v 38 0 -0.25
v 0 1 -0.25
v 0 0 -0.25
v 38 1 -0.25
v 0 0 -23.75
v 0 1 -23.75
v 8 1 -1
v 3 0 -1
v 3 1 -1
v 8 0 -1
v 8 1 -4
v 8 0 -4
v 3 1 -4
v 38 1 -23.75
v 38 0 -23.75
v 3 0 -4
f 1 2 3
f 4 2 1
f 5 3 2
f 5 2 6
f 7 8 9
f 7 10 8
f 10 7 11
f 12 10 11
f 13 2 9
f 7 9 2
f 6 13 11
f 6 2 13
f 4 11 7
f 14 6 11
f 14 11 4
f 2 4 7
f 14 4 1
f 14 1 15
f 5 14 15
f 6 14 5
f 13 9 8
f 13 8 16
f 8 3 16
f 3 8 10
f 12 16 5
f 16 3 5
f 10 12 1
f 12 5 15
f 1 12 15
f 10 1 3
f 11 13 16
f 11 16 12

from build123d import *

# Parameters (mm, degrees)
SKETCH1_W           = 40
SKETCH1_H           = 24
BOSS_EXTRUDE1_DEPTH = 2
SKETCH2_W           = 40
SKETCH2_H           = 24
SKETCH2_W_2         = 36
SKETCH2_H_2         = 22
BOSS_EXTRUDE3_DEPTH = 8
SKETCH5_W           = 4
SKETCH5_H           = 3
CUT_EXTRUDE1_DEPTH  = 2
SKETCH6_W           = 24
SKETCH6_H           = 10
CUT_EXTRUDE2_DEPTH  = 2
SKETCH7_W           = 22
SKETCH7_H           = 8
CUT_EXTRUDE3_DEPTH  = 2
SKETCH8_W           = 1
SKETCH8_H           = 3
CUT_EXTRUDE4_DEPTH  = 2
SKETCH9_W           = 38
SKETCH9_H           = 24
CUT_EXTRUDE5_DEPTH  = 9
SKETCH10_W          = 38
SKETCH10_H          = 1
CUT_EXTRUDE6_DEPTH  = 0.25
SKETCH11_W          = 38
SKETCH11_H          = 1
CUT_EXTRUDE7_DEPTH  = 0.25


with BuildPart() as part:
    # Sketch1 → Boss-Extrude1 (new body)
    with BuildSketch(Plane(origin=(0, 0, 0), x_dir=(1, 0, 0), z_dir=(0, 1, 0))):
        with Locations((20, 12)):
            Rectangle(SKETCH1_W, SKETCH1_H)
    extrude(amount=BOSS_EXTRUDE1_DEPTH)

    # Sketch2 → Boss-Extrude3 (add)
    with BuildSketch(Plane(origin=(0, 2, 0), x_dir=(1, 0, 0), z_dir=(0, 1, 0))):
        with Locations((20, 12)):
            Rectangle(SKETCH2_W, SKETCH2_H)
        with Locations((21, 12)):
            Rectangle(SKETCH2_W_2, SKETCH2_H_2, mode=Mode.SUBTRACT)
    extrude(amount=BOSS_EXTRUDE3_DEPTH)

    # Sketch5 → Cut-Extrude1 (cut)
    with BuildSketch(Plane(origin=(0, 2, 0), x_dir=(1, 0, 0), z_dir=(0, 1, 0))):
        with Locations((6, 2.5)):
            Rectangle(SKETCH5_W, SKETCH5_H)
    extrude(amount=-CUT_EXTRUDE1_DEPTH, mode=Mode.SUBTRACT)

    # Sketch6 → Cut-Extrude2 (cut)
    with BuildSketch(Plane(origin=(40, 0, 0), x_dir=(0, 0, -1), z_dir=(1, 0, 0))):
        with Locations((12, 5)):
            Rectangle(SKETCH6_W, SKETCH6_H)
    extrude(amount=-CUT_EXTRUDE2_DEPTH, mode=Mode.SUBTRACT)

    # Sketch7 → Cut-Extrude3 (cut)
    with BuildSketch(Plane(origin=(3, 0, 0), x_dir=(0, 0, -1), z_dir=(1, 0, 0))):
        with Locations((12, 6)):
            Rectangle(SKETCH7_W, SKETCH7_H)
    extrude(amount=-CUT_EXTRUDE3_DEPTH, mode=Mode.SUBTRACT)

    # Sketch8 → Cut-Extrude4 (cut)
    with BuildSketch(Plane(origin=(0, 2, 0), x_dir=(1, 0, 0), z_dir=(0, 1, 0))):
        with Locations((3.5, 2.5)):
            Rectangle(SKETCH8_W, SKETCH8_H)
    extrude(amount=-CUT_EXTRUDE4_DEPTH, mode=Mode.SUBTRACT)

    # Sketch9 → Cut-Extrude5 (cut)
    with BuildSketch(Plane(origin=(0, 10, 0), x_dir=(1, 0, 0), z_dir=(0, 1, 0))):
        with Locations((19, 12)):
            Rectangle(SKETCH9_W, SKETCH9_H)
    extrude(amount=-CUT_EXTRUDE5_DEPTH, mode=Mode.SUBTRACT)

    # Sketch10 → Cut-Extrude6 (cut)
    with BuildSketch(Plane.XY):
        with Locations((19, 0.5)):
            Rectangle(SKETCH10_W, SKETCH10_H)
    extrude(amount=-CUT_EXTRUDE6_DEPTH, mode=Mode.SUBTRACT)

    # Sketch11 → Cut-Extrude7 (cut)
    with BuildSketch(Plane(origin=(0, 0, -24), x_dir=(-1, 0, 0), z_dir=(0, 0, -1))):
        with Locations((-19, 0.5)):
            Rectangle(SKETCH11_W, SKETCH11_H)
    extrude(amount=-CUT_EXTRUDE7_DEPTH, mode=Mode.SUBTRACT)


solid = part.part
